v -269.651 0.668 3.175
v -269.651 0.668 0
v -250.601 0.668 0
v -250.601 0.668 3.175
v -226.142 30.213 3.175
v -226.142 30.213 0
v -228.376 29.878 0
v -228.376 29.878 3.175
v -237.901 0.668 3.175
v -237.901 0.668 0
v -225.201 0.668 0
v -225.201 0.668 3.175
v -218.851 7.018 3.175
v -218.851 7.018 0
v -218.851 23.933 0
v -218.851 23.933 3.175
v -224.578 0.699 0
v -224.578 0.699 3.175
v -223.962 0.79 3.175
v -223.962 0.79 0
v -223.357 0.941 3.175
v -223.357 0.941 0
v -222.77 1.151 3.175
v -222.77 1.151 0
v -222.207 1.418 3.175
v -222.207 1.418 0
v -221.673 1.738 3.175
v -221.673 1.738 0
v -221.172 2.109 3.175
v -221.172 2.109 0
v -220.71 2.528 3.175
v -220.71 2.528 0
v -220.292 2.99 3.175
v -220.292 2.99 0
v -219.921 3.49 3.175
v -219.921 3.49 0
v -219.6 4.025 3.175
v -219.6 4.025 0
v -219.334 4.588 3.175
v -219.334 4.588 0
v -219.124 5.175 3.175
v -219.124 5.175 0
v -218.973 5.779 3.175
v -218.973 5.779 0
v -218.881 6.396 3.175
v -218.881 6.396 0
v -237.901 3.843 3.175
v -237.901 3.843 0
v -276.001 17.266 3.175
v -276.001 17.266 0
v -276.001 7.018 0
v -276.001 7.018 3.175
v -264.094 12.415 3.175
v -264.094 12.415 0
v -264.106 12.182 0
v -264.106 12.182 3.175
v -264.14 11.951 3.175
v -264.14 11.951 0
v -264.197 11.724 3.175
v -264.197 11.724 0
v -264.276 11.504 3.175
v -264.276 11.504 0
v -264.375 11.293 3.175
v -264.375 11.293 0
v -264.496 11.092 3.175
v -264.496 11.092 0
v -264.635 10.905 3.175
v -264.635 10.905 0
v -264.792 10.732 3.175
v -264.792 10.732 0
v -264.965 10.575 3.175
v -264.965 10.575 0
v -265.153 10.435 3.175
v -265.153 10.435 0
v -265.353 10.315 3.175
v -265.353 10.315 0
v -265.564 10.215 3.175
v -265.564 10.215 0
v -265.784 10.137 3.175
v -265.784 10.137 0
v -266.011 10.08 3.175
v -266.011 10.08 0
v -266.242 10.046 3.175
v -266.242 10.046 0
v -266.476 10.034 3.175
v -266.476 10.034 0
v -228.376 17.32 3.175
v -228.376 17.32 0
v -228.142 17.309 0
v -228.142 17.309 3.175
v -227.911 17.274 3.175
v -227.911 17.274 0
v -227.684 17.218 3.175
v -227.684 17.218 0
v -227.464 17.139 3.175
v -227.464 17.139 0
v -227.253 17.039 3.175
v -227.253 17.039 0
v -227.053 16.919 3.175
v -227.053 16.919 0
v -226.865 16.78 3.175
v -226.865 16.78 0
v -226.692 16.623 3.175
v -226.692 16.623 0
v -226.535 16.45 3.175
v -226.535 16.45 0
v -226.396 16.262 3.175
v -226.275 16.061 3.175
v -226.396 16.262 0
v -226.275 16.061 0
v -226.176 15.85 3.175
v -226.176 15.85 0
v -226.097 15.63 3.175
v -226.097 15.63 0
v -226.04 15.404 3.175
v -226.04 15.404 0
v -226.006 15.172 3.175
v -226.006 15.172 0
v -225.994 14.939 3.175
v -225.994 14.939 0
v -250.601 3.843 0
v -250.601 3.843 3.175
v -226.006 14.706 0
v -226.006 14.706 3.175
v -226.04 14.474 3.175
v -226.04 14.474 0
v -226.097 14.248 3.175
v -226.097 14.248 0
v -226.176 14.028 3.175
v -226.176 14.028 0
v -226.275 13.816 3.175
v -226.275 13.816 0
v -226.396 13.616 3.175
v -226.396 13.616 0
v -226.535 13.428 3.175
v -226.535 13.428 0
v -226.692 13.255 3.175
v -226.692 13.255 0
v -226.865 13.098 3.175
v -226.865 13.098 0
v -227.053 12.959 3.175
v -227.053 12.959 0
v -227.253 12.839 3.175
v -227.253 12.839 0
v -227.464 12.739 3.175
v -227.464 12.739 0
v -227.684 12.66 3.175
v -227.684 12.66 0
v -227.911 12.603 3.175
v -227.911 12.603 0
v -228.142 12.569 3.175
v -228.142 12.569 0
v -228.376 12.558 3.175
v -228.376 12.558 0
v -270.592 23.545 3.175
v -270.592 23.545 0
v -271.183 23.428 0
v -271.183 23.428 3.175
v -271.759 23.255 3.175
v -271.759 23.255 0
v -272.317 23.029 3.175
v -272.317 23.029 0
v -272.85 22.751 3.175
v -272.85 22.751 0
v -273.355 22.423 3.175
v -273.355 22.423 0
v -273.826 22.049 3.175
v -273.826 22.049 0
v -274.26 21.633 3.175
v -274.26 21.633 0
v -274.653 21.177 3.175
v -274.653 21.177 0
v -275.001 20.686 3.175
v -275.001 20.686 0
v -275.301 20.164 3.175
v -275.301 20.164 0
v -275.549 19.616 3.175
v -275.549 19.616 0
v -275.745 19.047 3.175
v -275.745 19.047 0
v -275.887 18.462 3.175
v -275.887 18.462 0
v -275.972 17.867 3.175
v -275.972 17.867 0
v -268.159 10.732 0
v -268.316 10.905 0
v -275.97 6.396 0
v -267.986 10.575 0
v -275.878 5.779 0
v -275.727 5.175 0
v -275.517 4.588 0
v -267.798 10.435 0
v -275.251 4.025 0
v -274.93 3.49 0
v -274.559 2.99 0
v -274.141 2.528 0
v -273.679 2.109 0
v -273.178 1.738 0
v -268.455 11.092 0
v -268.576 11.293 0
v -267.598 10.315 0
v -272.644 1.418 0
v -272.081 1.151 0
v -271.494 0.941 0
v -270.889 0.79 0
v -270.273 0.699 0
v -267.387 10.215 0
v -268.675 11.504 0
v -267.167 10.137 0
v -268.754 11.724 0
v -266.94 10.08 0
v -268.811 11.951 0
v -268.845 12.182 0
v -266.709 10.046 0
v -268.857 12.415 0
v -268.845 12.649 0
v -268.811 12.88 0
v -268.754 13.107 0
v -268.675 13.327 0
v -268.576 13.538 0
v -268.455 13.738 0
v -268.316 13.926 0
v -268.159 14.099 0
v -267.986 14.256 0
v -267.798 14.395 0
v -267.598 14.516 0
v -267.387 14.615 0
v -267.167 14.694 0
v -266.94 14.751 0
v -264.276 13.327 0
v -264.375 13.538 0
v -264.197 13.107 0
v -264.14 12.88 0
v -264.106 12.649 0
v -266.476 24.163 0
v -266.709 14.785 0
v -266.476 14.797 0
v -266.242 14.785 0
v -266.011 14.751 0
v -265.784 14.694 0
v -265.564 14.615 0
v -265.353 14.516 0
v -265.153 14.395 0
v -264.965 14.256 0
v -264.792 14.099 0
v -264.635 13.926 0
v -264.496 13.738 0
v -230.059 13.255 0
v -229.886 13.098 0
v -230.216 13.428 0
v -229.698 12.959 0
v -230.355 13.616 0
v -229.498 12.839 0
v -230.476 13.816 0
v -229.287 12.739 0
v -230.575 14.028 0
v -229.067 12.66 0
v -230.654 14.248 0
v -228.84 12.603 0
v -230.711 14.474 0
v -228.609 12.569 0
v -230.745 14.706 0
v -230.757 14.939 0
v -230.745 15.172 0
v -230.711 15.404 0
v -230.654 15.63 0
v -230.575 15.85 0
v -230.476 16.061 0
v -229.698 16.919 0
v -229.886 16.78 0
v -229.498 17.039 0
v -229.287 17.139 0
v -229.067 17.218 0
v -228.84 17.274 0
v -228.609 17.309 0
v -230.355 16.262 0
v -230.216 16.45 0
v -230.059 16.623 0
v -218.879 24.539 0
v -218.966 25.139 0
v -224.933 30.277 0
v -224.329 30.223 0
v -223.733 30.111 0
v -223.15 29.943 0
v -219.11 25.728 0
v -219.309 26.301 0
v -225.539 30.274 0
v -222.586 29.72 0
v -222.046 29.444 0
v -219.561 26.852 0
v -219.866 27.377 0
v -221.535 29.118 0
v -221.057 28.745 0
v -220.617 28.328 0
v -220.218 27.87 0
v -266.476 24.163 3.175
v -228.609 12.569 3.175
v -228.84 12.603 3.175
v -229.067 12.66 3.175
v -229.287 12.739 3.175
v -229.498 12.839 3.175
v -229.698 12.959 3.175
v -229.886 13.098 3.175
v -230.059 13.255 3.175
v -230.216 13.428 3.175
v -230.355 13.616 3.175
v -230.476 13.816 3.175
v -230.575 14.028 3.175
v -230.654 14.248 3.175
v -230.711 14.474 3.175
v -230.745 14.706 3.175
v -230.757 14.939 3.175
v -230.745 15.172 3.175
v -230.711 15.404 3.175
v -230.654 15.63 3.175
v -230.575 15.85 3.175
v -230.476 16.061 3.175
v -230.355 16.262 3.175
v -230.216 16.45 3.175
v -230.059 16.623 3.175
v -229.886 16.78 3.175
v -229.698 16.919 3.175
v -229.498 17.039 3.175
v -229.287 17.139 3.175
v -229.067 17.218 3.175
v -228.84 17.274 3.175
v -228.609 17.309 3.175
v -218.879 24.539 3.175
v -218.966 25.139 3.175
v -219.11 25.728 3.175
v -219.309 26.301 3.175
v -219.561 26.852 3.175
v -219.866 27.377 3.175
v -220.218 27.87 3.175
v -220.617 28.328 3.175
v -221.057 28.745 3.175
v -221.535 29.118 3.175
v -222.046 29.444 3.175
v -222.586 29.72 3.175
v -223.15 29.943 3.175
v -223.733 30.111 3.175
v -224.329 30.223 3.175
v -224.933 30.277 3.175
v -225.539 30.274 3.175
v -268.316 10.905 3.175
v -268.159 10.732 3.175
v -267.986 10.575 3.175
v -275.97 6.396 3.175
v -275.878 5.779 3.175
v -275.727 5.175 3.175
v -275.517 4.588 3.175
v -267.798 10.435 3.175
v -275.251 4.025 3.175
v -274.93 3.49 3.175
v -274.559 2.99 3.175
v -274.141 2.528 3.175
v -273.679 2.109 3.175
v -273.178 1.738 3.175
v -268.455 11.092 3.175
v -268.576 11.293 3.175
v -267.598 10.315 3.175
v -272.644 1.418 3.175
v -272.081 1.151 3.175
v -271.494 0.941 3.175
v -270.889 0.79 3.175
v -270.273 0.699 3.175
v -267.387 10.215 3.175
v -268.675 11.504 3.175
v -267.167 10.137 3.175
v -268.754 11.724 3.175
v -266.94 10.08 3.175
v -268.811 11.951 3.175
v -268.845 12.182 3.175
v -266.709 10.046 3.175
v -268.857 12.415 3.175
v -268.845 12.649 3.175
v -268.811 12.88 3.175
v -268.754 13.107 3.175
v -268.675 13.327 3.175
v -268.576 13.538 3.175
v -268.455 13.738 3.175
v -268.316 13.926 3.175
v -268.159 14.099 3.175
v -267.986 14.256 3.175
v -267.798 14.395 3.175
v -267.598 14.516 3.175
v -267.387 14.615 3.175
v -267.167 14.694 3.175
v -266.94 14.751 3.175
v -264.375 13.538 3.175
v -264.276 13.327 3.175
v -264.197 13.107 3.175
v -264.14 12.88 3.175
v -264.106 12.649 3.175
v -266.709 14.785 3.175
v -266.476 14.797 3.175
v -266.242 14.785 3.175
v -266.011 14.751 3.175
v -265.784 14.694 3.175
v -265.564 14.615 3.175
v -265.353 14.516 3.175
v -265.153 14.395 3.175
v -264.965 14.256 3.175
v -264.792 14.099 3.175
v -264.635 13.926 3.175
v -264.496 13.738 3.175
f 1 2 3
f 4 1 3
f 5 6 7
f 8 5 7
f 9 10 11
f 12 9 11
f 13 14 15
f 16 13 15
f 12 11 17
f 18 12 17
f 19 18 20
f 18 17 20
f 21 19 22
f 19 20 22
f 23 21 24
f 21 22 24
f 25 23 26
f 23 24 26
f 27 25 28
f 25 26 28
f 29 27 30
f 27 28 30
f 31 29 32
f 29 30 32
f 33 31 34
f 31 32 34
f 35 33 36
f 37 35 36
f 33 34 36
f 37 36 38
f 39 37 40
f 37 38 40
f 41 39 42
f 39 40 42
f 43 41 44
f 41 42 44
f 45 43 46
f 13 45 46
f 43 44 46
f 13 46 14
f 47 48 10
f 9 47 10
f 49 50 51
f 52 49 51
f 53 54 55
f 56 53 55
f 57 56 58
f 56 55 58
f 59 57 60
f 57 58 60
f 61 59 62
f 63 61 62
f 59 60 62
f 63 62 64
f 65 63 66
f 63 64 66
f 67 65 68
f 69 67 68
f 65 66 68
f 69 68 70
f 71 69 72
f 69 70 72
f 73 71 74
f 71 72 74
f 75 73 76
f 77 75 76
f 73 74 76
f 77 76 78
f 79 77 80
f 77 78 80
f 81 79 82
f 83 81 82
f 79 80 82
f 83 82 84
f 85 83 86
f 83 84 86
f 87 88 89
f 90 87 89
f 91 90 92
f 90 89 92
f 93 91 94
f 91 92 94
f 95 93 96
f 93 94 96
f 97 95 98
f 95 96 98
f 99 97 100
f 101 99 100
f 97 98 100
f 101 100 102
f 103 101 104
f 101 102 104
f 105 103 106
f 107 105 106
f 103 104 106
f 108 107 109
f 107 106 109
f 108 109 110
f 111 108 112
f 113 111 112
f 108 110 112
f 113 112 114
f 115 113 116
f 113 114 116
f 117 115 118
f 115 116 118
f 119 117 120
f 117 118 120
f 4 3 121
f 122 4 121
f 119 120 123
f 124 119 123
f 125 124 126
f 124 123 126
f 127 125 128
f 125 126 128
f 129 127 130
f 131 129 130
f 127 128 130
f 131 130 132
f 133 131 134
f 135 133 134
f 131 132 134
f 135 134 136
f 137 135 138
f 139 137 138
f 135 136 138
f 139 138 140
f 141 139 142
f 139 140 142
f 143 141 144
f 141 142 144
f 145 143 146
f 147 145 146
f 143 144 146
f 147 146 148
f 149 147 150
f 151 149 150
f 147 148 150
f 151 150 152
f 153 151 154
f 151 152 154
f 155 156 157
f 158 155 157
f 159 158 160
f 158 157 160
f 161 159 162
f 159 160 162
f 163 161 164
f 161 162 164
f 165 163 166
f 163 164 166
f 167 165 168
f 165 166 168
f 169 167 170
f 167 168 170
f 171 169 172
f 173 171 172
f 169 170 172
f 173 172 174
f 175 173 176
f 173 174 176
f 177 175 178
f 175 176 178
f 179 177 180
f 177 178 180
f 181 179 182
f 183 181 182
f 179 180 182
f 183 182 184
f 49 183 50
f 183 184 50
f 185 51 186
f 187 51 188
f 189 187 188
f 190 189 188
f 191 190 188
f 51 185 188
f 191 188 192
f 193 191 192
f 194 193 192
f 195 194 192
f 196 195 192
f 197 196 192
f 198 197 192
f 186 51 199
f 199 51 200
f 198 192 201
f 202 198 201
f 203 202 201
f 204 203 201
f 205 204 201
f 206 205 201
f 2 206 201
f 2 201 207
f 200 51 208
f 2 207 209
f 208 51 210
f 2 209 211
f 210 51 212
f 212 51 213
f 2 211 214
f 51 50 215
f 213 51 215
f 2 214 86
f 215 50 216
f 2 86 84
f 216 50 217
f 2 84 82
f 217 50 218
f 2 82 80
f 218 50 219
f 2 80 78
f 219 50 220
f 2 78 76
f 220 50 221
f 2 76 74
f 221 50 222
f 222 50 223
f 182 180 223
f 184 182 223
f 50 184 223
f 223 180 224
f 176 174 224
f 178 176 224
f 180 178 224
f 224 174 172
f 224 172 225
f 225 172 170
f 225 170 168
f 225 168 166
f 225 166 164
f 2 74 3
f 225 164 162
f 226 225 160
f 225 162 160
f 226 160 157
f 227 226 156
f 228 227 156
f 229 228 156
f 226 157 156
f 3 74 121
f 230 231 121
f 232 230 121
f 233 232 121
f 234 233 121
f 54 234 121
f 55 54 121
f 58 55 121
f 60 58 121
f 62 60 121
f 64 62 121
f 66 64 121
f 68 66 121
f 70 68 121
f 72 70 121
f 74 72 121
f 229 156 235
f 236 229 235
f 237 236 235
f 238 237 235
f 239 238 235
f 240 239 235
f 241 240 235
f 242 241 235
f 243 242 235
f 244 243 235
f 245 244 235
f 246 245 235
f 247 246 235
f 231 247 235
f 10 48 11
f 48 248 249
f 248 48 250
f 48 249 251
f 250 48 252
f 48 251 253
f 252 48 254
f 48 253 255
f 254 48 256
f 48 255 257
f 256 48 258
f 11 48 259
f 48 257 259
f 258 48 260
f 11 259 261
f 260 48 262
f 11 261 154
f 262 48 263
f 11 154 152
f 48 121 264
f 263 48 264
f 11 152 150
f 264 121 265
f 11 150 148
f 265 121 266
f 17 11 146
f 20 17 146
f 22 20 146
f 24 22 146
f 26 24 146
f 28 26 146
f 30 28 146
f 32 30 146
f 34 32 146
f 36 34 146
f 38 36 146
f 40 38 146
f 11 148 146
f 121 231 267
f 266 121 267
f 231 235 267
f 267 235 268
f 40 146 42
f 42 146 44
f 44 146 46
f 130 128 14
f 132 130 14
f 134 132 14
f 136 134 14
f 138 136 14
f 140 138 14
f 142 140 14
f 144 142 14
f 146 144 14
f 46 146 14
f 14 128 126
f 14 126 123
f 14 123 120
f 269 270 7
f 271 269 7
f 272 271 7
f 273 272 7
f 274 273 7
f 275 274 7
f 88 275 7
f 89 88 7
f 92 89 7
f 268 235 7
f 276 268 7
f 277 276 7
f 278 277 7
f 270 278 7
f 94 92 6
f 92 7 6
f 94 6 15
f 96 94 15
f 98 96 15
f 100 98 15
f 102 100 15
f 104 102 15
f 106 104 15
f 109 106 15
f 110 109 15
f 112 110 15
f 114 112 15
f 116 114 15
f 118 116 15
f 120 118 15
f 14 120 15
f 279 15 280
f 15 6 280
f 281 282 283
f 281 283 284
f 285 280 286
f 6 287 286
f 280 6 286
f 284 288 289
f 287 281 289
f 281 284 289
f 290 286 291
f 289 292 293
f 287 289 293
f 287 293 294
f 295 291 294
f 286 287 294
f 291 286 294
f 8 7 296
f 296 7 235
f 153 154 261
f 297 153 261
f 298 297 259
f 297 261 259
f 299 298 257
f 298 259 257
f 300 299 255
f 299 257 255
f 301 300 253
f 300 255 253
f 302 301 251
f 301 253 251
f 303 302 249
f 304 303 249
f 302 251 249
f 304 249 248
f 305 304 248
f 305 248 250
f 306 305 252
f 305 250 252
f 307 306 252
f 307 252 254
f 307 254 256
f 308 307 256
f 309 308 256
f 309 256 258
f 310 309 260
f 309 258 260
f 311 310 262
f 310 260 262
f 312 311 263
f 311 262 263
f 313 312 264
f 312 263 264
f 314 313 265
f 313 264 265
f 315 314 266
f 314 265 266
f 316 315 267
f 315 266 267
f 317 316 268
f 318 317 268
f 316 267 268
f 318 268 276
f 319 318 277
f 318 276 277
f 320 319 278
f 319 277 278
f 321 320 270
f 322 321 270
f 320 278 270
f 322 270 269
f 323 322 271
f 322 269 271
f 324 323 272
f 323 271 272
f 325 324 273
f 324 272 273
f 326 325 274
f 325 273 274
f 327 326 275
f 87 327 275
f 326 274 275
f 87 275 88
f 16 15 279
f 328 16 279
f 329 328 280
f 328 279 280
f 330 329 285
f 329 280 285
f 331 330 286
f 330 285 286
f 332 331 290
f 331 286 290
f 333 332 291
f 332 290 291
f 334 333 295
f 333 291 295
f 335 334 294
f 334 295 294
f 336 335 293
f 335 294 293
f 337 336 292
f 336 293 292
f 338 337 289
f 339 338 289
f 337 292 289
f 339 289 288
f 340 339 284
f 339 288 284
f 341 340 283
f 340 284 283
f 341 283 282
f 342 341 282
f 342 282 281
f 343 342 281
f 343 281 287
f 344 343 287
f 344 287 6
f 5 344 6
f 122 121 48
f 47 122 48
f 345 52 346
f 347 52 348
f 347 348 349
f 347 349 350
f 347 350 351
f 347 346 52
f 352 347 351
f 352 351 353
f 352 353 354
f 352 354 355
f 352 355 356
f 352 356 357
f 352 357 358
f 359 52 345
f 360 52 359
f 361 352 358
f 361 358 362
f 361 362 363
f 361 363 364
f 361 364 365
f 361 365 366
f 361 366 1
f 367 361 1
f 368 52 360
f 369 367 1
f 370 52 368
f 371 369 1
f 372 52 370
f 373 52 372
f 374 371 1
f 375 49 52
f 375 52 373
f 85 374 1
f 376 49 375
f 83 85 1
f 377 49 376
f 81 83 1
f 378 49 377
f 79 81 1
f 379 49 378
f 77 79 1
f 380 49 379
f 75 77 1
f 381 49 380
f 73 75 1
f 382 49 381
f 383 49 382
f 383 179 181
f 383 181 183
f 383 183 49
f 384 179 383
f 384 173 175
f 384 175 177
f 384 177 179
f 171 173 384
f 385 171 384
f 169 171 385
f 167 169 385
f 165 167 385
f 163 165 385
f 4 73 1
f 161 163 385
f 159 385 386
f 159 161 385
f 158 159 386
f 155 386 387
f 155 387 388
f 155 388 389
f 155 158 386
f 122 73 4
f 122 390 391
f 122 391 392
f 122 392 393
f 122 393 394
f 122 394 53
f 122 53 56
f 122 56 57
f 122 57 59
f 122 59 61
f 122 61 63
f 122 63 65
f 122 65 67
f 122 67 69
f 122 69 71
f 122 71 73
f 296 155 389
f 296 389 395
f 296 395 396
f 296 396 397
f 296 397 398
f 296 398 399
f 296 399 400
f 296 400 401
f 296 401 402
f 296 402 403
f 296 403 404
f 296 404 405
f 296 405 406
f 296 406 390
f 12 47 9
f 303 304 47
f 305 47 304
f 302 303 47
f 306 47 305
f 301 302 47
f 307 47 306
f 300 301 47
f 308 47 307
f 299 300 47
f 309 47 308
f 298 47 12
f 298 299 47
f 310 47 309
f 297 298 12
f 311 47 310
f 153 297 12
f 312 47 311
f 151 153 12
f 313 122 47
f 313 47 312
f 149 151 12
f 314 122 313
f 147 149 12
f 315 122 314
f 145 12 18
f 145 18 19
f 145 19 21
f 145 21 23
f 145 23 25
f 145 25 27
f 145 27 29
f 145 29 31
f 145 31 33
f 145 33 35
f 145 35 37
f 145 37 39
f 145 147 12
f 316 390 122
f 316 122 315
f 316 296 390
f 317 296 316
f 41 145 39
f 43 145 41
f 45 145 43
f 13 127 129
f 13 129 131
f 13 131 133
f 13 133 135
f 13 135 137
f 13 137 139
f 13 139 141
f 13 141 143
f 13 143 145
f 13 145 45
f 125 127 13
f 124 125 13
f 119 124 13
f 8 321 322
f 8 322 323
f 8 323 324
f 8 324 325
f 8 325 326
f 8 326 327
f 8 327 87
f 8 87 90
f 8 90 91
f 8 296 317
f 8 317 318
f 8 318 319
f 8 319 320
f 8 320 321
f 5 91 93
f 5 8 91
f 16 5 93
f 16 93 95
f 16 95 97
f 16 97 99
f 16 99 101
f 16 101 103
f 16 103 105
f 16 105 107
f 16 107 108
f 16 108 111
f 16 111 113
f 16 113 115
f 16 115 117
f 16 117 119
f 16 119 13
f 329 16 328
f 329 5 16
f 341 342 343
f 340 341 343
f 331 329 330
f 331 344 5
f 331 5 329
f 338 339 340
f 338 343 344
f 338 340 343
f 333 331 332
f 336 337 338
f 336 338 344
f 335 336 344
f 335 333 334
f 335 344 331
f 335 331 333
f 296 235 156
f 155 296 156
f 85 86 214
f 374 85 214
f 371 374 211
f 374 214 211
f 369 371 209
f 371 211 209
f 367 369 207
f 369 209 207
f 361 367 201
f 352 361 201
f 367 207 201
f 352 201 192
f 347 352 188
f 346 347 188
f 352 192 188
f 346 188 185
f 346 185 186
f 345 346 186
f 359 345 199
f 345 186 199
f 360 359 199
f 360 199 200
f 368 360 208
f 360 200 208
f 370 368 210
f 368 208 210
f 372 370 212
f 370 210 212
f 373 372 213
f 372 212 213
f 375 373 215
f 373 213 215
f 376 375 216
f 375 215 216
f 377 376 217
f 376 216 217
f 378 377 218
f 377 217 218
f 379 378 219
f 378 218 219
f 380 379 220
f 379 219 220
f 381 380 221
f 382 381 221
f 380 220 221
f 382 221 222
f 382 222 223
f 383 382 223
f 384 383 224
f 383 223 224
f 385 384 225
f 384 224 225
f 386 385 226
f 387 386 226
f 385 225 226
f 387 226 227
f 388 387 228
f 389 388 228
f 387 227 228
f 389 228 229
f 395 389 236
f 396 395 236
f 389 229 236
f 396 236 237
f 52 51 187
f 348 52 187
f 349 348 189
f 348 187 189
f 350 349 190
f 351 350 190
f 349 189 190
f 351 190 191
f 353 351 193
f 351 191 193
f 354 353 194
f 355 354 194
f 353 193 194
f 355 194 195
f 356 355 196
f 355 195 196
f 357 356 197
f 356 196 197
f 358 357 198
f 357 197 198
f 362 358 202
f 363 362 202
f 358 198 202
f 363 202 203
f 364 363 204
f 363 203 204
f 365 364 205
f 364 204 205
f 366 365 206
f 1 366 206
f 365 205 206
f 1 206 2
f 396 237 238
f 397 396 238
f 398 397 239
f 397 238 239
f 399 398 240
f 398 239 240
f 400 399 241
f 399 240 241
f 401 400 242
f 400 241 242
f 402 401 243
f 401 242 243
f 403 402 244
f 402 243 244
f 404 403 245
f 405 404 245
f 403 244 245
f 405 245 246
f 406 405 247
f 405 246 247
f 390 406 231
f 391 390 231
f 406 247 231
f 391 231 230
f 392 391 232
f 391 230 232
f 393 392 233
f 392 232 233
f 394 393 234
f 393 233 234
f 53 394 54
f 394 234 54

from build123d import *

# Parameters (mm, degrees)
BOSS_EXTRUDE1_DEPTH = 3.175


with BuildPart() as part:
    # Sketch1 → Boss-Extrude1 (new body)
    with BuildSketch(Plane.XY):
        with BuildLine():
            Line((-266.475505146, 24.162932081), (-270.592467022, 23.5453878))
            ThreePointArc((-270.592467022, 23.5453878), (-274.462155482, 21.409374702), (-276.000505146, 17.265641959))
            Line((-276.000505146, 17.265641959), (-276.000505146, 7.017932081))
            ThreePointArc((-276.000505146, 7.017932081), (-274.140633206, 2.527804021), (-269.650505146, 0.667932081))
            Line((-269.650505146, 0.667932081), (-266.475505146, 0.667932081))
            Line((-266.475505146, 0.667932081), (-266.475505146, 10.034182081))
            ThreePointArc((-266.475505146, 10.034182081), (-268.856755146, 12.415432081), (-266.475505146, 14.796682081))
            Line((-266.475505146, 14.796682081), (-266.475505146, 24.162932081))
        make_face()
        with BuildLine():
            Line((-228.375505146, 29.877932081), (-266.475505146, 24.162932081))
            Line((-266.475505146, 24.162932081), (-266.475505146, 14.796682081))
            ThreePointArc((-266.475505146, 14.796682081), (-264.791707123, 14.099230104), (-264.094255146, 12.415432081))
            ThreePointArc((-264.094255146, 12.415432081), (-264.791707123, 10.731634059), (-266.475505146, 10.034182081))
            Line((-266.475505146, 10.034182081), (-266.475505146, 0.667932081))
            Line((-266.475505146, 0.667932081), (-250.600505146, 0.667932081))
            Line((-250.600505146, 0.667932081), (-250.600505146, 3.842932081))
            Line((-250.600505146, 3.842932081), (-237.900505146, 3.842932081))
            Line((-237.900505146, 3.842932081), (-237.900505146, 0.667932081))
            Line((-237.900505146, 0.667932081), (-228.375505146, 0.667932081))
            Line((-228.375505146, 0.667932081), (-228.375505146, 12.557716041))
            ThreePointArc((-228.375505146, 12.557716041), (-230.756755146, 14.938966041), (-228.375505146, 17.320216041))
            Line((-228.375505146, 17.320216041), (-228.375505146, 29.877932081))
        make_face()
        with BuildLine():
            Line((-226.142467022, 30.2128878), (-228.375505146, 29.877932081))
            Line((-228.375505146, 29.877932081), (-228.375505146, 17.320216041))
            ThreePointArc((-228.375505146, 17.320216041), (-226.691707123, 16.622764063), (-225.994255146, 14.938966041))
            ThreePointArc((-225.994255146, 14.938966041), (-226.691707123, 13.255168018), (-228.375505146, 12.557716041))
            Line((-228.375505146, 12.557716041), (-228.375505146, 0.667932081))
            Line((-228.375505146, 0.667932081), (-225.200505146, 0.667932081))
            ThreePointArc((-225.200505146, 0.667932081), (-220.710377085, 2.527804021), (-218.850505146, 7.017932081))
            Line((-218.850505146, 7.017932081), (-218.850505146, 23.933141959))
            ThreePointArc((-218.850505146, 23.933141959), (-221.056772403, 28.744792295), (-226.142467022, 30.2128878))
        make_face()
    extrude(amount=BOSS_EXTRUDE1_DEPTH)


solid = part.part
